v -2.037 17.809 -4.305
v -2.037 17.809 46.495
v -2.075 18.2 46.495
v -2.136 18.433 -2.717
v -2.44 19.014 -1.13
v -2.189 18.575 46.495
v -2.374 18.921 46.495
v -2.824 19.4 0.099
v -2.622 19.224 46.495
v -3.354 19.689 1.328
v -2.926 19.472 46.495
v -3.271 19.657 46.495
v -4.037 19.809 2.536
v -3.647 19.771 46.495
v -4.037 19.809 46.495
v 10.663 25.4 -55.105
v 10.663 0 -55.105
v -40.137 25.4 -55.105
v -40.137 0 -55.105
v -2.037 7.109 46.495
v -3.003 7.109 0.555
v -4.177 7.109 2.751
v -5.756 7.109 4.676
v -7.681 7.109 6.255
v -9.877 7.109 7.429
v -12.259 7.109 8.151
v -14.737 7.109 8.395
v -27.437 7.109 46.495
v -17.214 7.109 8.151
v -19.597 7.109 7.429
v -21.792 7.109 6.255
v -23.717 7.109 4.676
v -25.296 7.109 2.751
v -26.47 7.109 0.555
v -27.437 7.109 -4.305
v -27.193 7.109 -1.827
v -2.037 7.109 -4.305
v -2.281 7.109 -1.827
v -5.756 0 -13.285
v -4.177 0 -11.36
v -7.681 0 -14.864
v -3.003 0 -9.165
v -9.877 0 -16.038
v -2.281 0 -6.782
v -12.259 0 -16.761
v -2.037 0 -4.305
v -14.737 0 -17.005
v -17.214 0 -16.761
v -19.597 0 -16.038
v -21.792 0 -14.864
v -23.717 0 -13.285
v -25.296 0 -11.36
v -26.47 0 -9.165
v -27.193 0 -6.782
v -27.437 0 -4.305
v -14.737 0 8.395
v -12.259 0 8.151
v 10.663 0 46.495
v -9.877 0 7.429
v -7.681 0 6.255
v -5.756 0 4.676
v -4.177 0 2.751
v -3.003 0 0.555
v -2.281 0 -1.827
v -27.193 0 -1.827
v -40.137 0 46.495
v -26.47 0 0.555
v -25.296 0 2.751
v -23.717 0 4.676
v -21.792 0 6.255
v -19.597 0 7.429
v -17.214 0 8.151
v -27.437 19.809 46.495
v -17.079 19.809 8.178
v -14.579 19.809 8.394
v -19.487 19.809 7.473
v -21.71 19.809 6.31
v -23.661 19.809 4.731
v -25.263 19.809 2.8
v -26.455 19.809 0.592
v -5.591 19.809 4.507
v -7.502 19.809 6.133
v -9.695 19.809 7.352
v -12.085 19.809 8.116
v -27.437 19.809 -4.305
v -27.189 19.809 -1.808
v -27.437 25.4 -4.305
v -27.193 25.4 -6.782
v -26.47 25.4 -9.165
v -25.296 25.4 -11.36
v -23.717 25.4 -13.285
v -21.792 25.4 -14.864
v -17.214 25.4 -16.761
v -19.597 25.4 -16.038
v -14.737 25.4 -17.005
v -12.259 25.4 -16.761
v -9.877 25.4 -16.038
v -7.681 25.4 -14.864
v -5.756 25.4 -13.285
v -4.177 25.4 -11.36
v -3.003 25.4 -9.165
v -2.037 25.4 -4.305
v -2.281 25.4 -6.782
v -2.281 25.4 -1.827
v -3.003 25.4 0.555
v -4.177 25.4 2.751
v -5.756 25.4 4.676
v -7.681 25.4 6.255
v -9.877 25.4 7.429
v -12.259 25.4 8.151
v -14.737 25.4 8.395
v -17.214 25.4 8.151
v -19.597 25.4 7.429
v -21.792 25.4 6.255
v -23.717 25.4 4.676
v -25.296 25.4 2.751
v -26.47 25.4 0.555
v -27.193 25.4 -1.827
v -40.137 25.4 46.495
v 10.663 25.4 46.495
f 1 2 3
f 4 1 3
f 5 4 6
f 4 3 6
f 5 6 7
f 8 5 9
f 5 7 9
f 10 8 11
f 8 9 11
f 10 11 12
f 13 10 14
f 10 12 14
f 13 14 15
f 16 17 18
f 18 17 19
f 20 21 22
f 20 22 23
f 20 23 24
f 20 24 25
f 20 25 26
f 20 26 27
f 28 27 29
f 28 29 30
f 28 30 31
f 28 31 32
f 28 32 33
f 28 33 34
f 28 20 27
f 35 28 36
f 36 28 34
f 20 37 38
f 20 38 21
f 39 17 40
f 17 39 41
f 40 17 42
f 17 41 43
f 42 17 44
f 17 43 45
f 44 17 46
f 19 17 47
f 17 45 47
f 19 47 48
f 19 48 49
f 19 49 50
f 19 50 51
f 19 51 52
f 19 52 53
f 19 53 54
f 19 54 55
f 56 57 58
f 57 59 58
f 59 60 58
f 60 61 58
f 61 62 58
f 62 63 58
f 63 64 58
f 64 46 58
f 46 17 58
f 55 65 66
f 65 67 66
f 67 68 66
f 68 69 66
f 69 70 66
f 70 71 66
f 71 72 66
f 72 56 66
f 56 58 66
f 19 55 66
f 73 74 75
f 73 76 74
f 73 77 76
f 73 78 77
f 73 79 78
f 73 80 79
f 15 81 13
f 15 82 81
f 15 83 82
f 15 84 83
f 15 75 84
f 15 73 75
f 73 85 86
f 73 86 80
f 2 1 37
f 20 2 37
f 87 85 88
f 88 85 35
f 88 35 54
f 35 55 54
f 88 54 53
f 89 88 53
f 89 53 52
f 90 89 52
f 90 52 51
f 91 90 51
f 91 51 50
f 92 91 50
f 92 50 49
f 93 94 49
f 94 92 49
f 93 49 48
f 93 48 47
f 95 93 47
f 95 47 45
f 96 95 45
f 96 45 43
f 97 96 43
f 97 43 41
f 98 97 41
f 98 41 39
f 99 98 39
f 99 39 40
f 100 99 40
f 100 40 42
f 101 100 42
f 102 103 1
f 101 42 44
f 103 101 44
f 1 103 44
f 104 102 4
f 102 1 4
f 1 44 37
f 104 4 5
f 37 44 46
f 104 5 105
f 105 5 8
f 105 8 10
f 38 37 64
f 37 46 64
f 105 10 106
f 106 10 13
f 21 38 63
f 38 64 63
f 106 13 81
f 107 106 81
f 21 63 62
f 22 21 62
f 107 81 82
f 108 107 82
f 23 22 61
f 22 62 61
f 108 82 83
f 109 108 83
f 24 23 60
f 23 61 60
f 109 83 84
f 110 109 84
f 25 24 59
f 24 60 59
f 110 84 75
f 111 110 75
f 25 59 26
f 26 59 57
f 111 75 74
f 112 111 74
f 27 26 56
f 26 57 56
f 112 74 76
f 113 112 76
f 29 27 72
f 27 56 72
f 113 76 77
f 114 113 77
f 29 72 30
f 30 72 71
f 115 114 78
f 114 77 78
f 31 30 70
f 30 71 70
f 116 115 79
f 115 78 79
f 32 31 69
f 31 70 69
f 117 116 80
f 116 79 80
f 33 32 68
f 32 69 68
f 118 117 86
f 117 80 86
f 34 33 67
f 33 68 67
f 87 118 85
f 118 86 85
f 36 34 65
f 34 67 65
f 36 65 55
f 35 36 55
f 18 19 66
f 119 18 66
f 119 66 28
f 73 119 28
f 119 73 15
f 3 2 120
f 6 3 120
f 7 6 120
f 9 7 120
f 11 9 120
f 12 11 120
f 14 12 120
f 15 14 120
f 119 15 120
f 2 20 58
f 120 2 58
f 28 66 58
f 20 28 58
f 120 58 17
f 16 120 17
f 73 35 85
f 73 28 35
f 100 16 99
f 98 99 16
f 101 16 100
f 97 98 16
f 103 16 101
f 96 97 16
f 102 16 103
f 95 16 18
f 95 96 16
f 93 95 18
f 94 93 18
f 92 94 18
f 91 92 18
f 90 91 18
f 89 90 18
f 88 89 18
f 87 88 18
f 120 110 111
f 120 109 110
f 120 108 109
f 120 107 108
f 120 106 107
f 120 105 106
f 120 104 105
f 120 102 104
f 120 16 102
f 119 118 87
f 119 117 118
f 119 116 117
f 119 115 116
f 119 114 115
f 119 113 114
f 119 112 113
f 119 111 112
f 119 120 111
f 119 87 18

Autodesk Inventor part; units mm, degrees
ref_plane "YZ Plane" through (0, 0, 0) normal (1, 0, 0) x (0, 1, 0)
ref_plane "XZ Plane" through (0, 0, 0) normal (0, 1, 0) x (-1, 0, 0)
ref_plane "XY Plane" through (0, 0, 0) normal (0, 0, 1) x (1, 0, 0)
sketch "Sketch1" plane through (0, 0, 0) normal (0, 1, 0) x (-1, 0, 0)
  line L0 (40.1367, 46.4954) -> (-10.6633, 46.4954)
  line L1 (-10.6633, 46.4954) -> (-10.6633, -55.1046)
  line L2 (-10.6633, -55.1046) -> (40.1367, -55.1046)
  line L3 (40.1367, -55.1046) -> (40.1367, 46.4954)
  circle A0 centre (14.7367, -4.3046) radius 12.7
  point P0 (0, 0)
  dimension "d0" = 101.6
  dimension "d1" = 50.8
  dimension "d21" = 25.4
  dimension "d22" = 50.8
extrude "Extrusion1" add sketch "Sketch1" along normal blind 25.4
sketch "Sketch2" plane through (-40.1367, 0, 46.4954) normal (0, 0, 1) x (1, 0, 0)
  line L0 (12.7, 19.8094) -> (36.1, 19.8094)
  line L1 (38.1, 17.8094) -> (38.1, 7.1094)
  line L2 (38.1, 7.1094) -> (12.7, 7.1094)
  line L3 (12.7, 7.1094) -> (12.7, 19.8094)
  line L4 (50.8, 0) -> (50.8, 25.4) projected
  line L5 (0, 0) -> (0, 25.4) projected
  arc A0 (38.1, 17.8094) -> (36.1, 19.8094) centre (36.1, 17.8094) ccw
  point P0 (40.1367, 0)
  point P1 (38.1, 19.8094)
  dimension "d5" = 25.4
  dimension "d6" = 12.7
  dimension "d7" = 12.7
  dimension "d8" = 12.7
  dimension "d9" = 12.7
  dimension "d10" = 2
extrude "Extrusion2" cut sketch "Sketch2" against normal up to next
equation "\"d1\" = 0.5 * d0"
equation "\"d21\" = 0.5 * d1"
equation "\"d22\" = 0.5 * d0"
properties part number "Block"
